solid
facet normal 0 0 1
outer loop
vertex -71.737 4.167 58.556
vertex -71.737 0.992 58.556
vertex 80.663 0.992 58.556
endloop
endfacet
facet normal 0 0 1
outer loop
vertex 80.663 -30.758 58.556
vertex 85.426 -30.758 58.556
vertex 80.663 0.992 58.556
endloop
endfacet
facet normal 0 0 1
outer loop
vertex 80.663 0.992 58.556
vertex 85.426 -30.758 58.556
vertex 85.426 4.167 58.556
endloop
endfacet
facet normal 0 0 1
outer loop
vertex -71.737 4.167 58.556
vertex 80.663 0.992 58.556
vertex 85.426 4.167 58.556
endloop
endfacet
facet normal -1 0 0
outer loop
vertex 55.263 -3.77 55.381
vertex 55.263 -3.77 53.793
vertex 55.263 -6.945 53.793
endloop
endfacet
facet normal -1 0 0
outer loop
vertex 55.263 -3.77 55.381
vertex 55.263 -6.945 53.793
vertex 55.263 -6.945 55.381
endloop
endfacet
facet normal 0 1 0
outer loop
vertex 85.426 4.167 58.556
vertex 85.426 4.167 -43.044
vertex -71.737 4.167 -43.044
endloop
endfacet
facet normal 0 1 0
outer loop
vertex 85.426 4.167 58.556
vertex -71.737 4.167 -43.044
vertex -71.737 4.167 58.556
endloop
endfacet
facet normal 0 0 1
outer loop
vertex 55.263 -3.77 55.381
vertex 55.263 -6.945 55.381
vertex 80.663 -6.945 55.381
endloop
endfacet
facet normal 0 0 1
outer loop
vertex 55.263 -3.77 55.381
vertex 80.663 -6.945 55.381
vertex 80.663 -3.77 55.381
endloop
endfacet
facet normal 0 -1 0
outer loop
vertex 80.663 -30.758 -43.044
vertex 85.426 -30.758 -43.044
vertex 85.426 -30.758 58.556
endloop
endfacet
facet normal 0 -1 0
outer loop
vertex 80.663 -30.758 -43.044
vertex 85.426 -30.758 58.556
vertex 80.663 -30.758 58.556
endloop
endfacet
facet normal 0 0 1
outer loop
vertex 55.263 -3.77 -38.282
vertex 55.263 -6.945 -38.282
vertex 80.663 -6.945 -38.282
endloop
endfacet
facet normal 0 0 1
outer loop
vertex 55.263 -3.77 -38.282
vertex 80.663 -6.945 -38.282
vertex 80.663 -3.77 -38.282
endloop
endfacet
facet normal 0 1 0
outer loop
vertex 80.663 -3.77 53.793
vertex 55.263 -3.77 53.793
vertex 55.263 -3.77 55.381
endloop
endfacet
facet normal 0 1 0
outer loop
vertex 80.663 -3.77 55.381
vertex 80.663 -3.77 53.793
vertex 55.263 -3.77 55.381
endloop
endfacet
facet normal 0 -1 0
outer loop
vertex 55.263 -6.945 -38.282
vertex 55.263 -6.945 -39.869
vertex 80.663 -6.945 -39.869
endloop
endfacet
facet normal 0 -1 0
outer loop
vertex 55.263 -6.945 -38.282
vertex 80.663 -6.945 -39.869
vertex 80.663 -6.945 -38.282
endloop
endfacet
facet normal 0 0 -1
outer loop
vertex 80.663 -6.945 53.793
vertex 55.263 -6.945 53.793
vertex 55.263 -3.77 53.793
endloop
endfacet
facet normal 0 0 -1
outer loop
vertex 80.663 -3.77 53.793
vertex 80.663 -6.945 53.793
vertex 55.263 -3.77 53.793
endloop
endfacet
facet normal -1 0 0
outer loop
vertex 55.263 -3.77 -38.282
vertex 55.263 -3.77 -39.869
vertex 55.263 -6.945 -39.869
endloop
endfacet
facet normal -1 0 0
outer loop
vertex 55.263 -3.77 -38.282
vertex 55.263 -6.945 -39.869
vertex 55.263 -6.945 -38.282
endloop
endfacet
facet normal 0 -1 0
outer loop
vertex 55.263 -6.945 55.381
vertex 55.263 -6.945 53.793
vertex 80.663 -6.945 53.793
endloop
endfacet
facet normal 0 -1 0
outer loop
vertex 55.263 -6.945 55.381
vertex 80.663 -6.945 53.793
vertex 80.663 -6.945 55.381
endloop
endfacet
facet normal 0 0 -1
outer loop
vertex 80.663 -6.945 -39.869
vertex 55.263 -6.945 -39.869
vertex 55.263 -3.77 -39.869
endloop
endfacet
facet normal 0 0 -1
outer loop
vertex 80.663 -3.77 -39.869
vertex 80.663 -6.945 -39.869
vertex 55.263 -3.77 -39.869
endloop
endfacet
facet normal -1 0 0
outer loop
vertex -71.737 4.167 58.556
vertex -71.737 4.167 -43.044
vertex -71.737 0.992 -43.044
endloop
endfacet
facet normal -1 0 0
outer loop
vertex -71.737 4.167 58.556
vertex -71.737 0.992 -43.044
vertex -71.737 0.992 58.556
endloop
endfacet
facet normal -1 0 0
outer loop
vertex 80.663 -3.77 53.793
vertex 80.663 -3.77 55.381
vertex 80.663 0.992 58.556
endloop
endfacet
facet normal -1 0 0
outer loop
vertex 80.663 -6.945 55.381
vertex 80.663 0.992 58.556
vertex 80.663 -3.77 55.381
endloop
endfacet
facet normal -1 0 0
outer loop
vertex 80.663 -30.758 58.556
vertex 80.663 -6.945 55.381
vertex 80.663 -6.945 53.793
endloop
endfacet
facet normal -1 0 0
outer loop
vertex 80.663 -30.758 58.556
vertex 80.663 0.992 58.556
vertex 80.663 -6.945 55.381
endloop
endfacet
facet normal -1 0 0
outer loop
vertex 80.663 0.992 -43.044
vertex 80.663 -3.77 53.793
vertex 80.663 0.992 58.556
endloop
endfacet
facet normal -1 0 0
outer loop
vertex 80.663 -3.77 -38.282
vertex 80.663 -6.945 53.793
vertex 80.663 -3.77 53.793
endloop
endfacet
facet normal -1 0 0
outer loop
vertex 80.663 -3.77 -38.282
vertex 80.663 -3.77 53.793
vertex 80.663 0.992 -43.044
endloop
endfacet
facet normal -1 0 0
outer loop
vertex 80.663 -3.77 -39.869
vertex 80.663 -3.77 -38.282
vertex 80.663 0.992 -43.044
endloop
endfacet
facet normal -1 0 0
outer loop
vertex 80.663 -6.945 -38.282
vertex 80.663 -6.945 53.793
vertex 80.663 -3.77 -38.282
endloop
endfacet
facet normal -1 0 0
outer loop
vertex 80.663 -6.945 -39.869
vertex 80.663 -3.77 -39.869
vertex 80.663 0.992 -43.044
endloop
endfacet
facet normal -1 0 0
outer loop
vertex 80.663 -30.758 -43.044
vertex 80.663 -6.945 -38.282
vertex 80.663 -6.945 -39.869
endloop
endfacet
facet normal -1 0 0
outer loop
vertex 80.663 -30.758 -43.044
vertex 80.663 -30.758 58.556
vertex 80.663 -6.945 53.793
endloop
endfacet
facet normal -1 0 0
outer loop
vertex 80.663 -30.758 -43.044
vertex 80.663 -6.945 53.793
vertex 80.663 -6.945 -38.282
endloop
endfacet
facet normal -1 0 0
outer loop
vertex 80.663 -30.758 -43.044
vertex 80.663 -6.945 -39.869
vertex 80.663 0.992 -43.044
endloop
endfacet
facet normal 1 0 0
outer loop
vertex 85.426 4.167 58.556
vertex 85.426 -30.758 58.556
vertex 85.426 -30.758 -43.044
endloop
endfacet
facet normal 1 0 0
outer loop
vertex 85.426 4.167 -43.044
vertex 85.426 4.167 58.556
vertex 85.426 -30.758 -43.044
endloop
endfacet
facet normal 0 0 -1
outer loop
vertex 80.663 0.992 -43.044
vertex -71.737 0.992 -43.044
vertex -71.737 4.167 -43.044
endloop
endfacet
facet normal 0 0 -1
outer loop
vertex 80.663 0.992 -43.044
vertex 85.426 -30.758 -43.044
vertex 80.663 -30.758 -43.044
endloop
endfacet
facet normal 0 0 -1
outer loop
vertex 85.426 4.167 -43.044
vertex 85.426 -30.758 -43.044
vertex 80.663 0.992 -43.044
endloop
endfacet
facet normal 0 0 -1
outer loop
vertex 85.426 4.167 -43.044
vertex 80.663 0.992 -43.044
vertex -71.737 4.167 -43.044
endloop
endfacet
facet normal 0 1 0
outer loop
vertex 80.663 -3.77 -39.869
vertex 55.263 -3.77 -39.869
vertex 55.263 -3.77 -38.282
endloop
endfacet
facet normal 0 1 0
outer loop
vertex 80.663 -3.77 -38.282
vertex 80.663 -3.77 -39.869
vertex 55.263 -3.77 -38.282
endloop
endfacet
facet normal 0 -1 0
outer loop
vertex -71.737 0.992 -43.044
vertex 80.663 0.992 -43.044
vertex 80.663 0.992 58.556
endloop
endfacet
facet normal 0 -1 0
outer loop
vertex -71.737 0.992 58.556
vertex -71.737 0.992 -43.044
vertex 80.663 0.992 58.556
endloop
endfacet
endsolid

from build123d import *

# Parameters (mm, degrees)
SKETCH1_W           = 4.7625
SKETCH1_H           = 101.6
BOSS_EXTRUDE1_DEPTH = 34.925
SKETCH2_W           = 101.6
SKETCH2_H           = 3.175
BOSS_EXTRUDE2_DEPTH = 152.4
SKETCH2_4_W         = 1.5875
SKETCH2_4_H         = 3.175
BOSS_EXTRUDE3_DEPTH = 25.4


with BuildPart() as part:
    # Sketch1 → Boss-Extrude1 (new body)
    with BuildSketch(Plane(origin=(0, -30.757642186, 0), x_dir=(-1, 0, 0), z_dir=(0, -1, 0))):
        with Locations((-83.04427371, -7.755970668)):
            Rectangle(SKETCH1_W, SKETCH1_H)
    extrude(amount=-BOSS_EXTRUDE1_DEPTH)

    # Sketch2 → Boss-Extrude2 (add)
    with BuildSketch(Plane.ZY.offset(-80.66302371)):
        with Locations((7.755970668, 2.579857814)):
            Rectangle(SKETCH2_W, SKETCH2_H)
    extrude(amount=BOSS_EXTRUDE2_DEPTH)

    # Sketch2<4> → Boss-Extrude3 (add)
    with BuildSketch(Plane.ZY.offset(-80.66302371)):
        with Locations((-39.075279332, -5.357642186)):
            Rectangle(SKETCH2_4_W, SKETCH2_4_H)
        with Locations((54.587220668, -5.357642186)):
            Rectangle(SKETCH2_4_W, SKETCH2_4_H)
    extrude(amount=BOSS_EXTRUDE3_DEPTH)


solid = part.part
